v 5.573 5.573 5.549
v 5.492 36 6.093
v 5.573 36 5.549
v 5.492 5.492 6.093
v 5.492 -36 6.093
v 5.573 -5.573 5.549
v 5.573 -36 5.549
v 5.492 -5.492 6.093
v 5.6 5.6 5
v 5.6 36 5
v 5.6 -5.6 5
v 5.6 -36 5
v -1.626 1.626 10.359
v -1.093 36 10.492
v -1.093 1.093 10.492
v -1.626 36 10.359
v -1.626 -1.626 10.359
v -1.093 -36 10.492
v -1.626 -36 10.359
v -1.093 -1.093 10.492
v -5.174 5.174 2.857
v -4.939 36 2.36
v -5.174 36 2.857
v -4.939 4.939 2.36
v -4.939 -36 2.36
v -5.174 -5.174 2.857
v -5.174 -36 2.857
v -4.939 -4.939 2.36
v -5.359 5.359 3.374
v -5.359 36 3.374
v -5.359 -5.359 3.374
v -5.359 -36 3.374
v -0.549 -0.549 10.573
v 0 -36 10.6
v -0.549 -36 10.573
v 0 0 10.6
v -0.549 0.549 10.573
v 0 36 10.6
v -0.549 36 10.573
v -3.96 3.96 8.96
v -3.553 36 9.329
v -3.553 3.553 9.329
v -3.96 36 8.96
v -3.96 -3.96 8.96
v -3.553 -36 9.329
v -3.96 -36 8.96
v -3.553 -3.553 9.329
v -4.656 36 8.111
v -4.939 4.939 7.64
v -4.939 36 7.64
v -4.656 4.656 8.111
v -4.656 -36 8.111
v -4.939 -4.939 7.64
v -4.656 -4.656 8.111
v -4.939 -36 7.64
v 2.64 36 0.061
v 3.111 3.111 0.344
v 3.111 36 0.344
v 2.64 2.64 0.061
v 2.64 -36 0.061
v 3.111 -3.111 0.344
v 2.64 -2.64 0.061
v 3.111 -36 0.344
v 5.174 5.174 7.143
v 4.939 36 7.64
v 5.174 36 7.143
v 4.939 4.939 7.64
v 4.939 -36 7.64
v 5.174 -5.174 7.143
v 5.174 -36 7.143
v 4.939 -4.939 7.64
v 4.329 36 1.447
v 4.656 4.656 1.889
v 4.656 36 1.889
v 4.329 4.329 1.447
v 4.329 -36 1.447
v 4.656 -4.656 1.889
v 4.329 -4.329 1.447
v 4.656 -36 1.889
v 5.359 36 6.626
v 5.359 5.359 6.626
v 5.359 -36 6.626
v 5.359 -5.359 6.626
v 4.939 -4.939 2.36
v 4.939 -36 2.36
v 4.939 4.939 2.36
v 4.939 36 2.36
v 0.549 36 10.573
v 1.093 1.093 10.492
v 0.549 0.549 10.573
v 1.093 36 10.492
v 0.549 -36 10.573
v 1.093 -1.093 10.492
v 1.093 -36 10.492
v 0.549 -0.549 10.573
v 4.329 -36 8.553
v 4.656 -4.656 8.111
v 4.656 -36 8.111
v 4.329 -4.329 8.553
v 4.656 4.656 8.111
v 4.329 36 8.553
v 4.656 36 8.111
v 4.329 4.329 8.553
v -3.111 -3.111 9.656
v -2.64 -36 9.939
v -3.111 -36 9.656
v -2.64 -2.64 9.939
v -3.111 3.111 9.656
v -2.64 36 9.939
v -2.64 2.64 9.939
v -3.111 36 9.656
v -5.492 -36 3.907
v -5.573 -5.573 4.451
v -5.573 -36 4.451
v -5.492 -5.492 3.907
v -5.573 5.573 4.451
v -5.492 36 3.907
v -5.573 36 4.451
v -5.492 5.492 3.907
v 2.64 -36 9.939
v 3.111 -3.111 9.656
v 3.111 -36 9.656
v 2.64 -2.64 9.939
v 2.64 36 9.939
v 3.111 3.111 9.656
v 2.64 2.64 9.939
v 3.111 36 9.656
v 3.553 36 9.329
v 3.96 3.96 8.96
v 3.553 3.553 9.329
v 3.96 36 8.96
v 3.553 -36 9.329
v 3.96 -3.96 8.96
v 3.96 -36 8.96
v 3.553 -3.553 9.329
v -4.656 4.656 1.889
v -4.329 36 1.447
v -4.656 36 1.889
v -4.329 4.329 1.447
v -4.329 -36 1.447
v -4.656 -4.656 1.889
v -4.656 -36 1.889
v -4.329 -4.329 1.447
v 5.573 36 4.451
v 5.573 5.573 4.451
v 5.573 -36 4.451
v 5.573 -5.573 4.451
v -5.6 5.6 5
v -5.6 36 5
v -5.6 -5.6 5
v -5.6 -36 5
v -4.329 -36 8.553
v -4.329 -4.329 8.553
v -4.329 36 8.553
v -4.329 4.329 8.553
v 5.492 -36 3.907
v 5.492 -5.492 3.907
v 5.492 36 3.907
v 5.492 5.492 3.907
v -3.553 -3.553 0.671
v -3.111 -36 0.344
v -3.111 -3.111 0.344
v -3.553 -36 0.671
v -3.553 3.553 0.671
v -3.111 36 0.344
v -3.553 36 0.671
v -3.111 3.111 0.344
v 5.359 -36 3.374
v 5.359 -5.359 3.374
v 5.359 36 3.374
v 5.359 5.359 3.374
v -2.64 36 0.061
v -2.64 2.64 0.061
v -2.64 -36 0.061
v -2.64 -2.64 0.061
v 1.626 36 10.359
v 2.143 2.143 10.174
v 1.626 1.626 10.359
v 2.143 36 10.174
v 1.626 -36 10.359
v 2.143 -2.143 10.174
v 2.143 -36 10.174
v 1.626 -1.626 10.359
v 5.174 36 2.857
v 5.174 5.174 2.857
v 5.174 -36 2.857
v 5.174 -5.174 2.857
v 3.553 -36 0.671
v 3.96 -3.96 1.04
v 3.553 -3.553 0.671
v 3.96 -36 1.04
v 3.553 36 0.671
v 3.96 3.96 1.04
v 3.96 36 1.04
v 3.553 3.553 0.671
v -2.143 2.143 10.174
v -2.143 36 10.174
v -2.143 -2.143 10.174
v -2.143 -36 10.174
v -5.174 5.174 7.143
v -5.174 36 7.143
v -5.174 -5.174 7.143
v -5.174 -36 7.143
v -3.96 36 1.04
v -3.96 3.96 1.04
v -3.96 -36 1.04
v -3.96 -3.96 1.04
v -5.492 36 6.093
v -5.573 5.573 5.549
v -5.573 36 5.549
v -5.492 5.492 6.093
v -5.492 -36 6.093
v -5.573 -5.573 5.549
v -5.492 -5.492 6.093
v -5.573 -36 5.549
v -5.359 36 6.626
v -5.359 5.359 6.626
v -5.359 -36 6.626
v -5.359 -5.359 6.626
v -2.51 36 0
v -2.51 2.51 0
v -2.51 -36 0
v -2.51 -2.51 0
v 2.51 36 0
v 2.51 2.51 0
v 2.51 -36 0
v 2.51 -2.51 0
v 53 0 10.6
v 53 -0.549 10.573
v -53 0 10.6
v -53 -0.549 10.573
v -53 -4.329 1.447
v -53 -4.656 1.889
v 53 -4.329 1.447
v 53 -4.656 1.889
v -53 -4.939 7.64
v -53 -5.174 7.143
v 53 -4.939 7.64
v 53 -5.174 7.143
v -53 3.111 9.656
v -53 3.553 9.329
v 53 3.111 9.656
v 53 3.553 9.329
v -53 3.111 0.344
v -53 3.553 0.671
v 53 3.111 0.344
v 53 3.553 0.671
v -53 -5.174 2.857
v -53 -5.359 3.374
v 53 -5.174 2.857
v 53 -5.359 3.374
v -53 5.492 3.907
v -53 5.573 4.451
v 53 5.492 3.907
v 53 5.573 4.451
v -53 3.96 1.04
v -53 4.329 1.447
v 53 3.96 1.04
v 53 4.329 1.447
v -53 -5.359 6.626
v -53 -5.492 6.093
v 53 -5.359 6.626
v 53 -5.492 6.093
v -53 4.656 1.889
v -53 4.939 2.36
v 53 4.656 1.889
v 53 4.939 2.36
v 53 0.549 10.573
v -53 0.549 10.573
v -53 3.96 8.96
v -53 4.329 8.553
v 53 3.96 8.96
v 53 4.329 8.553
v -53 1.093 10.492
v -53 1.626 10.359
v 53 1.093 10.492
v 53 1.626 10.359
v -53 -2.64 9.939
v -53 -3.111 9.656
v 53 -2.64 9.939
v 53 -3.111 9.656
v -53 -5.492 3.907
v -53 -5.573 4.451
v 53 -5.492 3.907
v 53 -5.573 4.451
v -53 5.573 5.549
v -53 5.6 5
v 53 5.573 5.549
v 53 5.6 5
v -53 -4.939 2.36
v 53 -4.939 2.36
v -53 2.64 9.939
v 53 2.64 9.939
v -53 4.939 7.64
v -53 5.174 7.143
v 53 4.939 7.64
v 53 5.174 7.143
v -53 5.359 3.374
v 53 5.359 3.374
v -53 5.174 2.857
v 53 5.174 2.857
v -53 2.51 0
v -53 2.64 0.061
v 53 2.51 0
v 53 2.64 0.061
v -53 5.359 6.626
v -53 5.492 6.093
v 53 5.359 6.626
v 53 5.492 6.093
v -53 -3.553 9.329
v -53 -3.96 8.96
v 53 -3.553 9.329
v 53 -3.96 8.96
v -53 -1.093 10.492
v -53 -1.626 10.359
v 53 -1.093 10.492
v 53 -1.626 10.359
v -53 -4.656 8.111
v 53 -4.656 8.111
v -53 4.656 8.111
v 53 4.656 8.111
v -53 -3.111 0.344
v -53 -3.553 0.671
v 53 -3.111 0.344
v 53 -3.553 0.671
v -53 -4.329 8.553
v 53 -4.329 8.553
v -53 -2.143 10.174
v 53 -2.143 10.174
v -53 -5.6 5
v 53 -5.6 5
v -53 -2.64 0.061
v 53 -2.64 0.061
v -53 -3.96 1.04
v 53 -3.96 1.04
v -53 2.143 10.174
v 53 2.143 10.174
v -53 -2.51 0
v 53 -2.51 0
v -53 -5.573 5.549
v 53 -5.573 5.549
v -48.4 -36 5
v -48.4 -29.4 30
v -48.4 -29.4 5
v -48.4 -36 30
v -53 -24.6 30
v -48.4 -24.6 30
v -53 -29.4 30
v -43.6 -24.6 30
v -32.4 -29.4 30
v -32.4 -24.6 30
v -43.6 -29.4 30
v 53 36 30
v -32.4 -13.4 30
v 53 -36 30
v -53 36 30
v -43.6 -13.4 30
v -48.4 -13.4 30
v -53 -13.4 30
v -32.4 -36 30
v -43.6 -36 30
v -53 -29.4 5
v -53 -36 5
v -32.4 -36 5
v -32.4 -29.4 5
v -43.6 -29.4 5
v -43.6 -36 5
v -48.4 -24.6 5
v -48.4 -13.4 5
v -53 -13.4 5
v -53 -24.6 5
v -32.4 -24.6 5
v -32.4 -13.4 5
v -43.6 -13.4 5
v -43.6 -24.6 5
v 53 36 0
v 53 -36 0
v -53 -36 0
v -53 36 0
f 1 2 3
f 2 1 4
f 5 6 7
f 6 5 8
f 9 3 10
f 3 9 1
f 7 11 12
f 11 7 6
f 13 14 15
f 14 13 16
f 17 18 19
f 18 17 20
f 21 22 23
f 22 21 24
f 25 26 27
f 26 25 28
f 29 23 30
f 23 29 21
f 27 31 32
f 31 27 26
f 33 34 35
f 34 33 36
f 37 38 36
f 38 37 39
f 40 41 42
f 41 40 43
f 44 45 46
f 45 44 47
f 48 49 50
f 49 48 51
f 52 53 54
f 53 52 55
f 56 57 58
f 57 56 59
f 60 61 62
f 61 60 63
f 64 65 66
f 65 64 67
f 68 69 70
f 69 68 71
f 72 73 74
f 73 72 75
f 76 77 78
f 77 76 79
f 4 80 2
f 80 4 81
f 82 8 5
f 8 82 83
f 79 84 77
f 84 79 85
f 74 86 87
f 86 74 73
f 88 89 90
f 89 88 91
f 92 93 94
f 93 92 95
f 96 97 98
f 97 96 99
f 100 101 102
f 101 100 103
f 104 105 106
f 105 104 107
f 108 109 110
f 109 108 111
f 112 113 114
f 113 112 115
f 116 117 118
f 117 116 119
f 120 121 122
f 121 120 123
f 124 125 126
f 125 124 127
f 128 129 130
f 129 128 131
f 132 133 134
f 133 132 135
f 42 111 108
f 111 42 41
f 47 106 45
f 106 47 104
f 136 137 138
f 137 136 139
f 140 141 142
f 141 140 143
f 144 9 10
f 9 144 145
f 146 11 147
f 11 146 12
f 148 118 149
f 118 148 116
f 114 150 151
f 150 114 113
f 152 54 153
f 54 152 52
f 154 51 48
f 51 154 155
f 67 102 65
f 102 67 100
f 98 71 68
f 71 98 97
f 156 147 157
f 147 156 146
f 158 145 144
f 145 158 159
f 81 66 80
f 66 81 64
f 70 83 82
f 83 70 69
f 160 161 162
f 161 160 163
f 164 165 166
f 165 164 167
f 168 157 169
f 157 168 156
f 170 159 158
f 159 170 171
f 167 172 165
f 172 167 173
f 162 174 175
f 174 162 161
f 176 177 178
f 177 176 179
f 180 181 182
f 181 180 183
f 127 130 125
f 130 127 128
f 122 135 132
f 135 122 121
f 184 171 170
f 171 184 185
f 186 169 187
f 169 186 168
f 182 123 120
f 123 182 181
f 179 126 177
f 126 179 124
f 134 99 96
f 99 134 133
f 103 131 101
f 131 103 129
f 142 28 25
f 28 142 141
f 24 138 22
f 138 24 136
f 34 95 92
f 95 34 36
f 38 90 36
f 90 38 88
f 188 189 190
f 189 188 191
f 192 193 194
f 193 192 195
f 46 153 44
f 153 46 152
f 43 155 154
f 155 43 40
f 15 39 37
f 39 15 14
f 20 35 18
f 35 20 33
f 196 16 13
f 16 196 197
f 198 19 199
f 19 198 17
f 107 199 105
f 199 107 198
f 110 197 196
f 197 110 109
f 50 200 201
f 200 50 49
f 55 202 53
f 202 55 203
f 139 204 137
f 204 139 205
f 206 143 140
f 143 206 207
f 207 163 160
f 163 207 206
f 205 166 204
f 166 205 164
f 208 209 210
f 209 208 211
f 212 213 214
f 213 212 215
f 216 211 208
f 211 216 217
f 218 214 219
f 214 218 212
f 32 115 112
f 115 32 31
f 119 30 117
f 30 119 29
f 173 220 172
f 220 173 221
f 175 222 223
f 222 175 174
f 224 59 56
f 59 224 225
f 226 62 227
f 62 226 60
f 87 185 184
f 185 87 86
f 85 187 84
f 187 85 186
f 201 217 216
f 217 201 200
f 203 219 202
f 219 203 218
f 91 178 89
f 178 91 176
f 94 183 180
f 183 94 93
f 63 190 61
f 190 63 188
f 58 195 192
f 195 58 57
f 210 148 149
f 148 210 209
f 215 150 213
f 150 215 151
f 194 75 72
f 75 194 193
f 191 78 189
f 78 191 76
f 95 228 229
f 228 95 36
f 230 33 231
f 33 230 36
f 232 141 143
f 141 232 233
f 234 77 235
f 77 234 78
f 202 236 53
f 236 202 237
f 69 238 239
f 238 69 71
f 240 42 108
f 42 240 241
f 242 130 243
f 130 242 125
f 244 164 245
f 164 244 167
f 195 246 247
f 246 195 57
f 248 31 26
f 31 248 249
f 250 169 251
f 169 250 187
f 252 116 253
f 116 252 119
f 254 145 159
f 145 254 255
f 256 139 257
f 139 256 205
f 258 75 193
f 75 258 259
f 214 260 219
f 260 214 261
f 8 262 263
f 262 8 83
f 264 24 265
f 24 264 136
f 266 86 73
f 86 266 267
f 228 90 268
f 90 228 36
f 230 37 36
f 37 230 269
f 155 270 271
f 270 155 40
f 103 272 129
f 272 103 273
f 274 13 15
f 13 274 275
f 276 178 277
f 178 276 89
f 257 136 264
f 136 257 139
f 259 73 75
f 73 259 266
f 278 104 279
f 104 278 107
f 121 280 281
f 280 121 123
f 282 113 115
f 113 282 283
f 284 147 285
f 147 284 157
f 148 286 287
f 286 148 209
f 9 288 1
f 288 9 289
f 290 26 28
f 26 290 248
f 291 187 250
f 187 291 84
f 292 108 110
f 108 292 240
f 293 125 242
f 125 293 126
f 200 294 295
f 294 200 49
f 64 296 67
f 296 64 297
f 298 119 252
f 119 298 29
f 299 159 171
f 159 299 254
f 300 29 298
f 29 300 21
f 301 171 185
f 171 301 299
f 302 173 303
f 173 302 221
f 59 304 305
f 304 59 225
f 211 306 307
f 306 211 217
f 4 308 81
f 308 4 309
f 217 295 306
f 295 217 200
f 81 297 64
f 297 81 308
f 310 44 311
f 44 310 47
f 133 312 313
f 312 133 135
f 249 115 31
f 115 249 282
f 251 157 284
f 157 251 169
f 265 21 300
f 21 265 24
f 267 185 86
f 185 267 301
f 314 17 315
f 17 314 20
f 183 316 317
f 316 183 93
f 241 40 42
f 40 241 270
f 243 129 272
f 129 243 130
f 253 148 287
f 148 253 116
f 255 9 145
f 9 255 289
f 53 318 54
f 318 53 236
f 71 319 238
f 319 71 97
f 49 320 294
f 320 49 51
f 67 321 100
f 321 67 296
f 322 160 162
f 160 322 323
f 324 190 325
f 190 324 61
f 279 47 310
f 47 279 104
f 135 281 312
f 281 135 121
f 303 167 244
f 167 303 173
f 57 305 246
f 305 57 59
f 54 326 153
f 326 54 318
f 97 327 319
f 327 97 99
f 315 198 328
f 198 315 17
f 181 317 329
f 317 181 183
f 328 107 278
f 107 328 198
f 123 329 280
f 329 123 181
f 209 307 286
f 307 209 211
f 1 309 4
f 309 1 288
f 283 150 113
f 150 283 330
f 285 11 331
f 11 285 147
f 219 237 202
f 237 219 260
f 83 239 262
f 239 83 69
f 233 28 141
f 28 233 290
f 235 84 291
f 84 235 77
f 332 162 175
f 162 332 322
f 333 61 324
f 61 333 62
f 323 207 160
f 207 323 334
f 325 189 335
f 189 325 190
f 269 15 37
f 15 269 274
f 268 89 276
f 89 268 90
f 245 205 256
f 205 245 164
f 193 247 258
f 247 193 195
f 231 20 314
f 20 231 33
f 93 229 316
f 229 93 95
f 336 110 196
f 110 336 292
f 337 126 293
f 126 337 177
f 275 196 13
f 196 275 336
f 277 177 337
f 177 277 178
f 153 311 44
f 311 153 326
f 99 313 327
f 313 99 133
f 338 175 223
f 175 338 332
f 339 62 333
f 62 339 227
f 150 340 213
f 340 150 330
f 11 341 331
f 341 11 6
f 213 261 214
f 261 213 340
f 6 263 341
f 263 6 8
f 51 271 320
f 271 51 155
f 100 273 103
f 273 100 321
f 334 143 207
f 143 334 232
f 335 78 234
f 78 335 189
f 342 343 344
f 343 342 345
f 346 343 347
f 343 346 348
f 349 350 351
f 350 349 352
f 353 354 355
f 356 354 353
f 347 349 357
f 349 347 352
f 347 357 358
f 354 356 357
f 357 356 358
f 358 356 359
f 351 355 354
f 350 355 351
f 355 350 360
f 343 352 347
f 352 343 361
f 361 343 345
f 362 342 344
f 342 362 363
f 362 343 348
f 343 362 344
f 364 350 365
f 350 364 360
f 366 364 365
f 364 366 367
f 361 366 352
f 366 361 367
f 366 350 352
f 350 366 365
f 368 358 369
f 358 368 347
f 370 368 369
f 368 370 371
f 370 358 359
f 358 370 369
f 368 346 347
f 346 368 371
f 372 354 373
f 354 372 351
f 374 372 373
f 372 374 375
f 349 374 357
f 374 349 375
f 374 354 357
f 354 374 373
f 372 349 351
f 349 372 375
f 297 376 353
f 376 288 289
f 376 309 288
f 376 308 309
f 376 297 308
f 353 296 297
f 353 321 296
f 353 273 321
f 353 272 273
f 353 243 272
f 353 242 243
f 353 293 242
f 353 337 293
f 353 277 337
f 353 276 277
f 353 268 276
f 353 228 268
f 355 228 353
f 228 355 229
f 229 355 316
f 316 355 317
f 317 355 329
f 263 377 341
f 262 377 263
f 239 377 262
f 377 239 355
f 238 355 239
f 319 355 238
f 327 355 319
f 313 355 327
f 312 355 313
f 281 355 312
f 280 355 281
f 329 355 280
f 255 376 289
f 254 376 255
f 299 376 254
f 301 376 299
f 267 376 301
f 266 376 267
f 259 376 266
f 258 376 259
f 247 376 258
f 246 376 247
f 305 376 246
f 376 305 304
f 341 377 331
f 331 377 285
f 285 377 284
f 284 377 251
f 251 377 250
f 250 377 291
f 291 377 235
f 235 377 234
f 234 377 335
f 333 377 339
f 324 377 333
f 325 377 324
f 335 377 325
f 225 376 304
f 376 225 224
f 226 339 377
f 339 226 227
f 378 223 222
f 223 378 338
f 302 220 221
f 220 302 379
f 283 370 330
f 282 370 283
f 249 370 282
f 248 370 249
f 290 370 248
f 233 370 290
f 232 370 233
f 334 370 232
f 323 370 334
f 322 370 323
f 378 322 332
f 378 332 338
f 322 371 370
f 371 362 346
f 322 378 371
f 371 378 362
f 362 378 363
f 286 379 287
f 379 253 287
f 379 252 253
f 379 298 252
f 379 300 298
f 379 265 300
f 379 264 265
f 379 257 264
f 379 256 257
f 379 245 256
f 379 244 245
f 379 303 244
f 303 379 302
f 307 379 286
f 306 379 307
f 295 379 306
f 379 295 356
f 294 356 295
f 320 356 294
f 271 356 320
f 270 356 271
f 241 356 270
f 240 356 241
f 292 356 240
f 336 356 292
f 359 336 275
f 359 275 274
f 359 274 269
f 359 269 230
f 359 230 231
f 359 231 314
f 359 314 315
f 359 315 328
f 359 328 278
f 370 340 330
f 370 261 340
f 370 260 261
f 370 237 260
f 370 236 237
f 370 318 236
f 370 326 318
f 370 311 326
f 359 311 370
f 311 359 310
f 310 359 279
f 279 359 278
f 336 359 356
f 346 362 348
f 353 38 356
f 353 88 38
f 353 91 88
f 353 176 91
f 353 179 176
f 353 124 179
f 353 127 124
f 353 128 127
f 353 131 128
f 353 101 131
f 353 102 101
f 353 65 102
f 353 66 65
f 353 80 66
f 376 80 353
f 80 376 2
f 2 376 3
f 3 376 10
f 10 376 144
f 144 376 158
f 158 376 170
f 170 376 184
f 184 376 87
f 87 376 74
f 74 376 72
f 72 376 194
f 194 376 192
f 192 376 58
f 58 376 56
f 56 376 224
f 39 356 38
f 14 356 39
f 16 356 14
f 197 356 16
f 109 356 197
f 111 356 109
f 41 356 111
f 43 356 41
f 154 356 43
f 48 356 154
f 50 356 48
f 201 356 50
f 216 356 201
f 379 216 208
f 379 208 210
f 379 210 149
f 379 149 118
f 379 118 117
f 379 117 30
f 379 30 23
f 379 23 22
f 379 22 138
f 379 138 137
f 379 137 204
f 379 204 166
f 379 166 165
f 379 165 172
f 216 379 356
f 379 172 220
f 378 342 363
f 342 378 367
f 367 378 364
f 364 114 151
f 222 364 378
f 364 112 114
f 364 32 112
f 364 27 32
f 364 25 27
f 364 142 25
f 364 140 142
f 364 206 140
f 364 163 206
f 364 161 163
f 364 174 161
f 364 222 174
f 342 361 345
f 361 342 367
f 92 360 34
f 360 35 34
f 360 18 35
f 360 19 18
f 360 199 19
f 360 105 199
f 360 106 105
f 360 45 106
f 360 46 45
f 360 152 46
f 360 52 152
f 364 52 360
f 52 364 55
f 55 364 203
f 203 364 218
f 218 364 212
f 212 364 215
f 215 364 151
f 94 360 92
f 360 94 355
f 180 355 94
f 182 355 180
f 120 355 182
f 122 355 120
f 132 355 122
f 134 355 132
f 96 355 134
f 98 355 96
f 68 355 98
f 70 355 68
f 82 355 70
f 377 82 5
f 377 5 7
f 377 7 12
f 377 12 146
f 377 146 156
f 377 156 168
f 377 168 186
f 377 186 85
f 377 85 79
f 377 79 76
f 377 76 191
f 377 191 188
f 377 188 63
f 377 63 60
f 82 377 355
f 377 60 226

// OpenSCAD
// Built by bench/smallmodels/features/compiler.py from a list of features.
$fn = 64;
difference() {
  union() {
    translate([0, 0, 0]) translate([-53, -36, 0]) cube([106, 72, 30]);
  }
  union() {
    translate([0, 0, 5]) rotate([0, 0, 0]) rotate([90, 0, 0]) cylinder(d = 11.2, h = 1120, center = true);
    translate([0, 0, 5]) rotate([0, 0, 0]) rotate([0, 90, 0]) cylinder(d = 11.2, h = 1120, center = true);
    translate([-118, -67, 5]) rotate([0, 0, 0]) translate([-5.6, -5.6, 0]) cube([11.2, 11.2, 25]);
    translate([-102, -67, 5]) rotate([0, 0, 0]) translate([-5.6, -5.6, 0]) cube([11.2, 11.2, 25]);
    translate([-86, -67, 5]) rotate([0, 0, 0]) translate([-5.6, -5.6, 0]) cube([11.2, 11.2, 25]);
    translate([-70, -67, 5]) rotate([0, 0, 0]) translate([-5.6, -5.6, 0]) cube([11.2, 11.2, 25]);
    translate([-54, -67, 5]) rotate([0, 0, 0]) translate([-5.6, -5.6, 0]) cube([11.2, 11.2, 25]);
    translate([-38, -67, 5]) rotate([0, 0, 0]) translate([-5.6, -5.6, 0]) cube([11.2, 11.2, 25]);
    translate([-118, -51, 5]) rotate([0, 0, 0]) translate([-5.6, -5.6, 0]) cube([11.2, 11.2, 25]);
    translate([-102, -51, 5]) rotate([0, 0, 0]) translate([-5.6, -5.6, 0]) cube([11.2, 11.2, 25]);
    translate([-86, -51, 5]) rotate([0, 0, 0]) translate([-5.6, -5.6, 0]) cube([11.2, 11.2, 25]);
    translate([-70, -51, 5]) rotate([0, 0, 0]) translate([-5.6, -5.6, 0]) cube([11.2, 11.2, 25]);
    translate([-54, -51, 5]) rotate([0, 0, 0]) translate([-5.6, -5.6, 0]) cube([11.2, 11.2, 25]);
    translate([-38, -51, 5]) rotate([0, 0, 0]) translate([-5.6, -5.6, 0]) cube([11.2, 11.2, 25]);
    translate([-118, -35, 5]) rotate([0, 0, 0]) translate([-5.6, -5.6, 0]) cube([11.2, 11.2, 25]);
    translate([-102, -35, 5]) rotate([0, 0, 0]) translate([-5.6, -5.6, 0]) cube([11.2, 11.2, 25]);
    translate([-86, -35, 5]) rotate([0, 0, 0]) translate([-5.6, -5.6, 0]) cube([11.2, 11.2, 25]);
    translate([-70, -35, 5]) rotate([0, 0, 0]) translate([-5.6, -5.6, 0]) cube([11.2, 11.2, 25]);
    translate([-54, -35, 5]) rotate([0, 0, 0]) translate([-5.6, -5.6, 0]) cube([11.2, 11.2, 25]);
    translate([-38, -35, 5]) rotate([0, 0, 0]) translate([-5.6, -5.6, 0]) cube([11.2, 11.2, 25]);
    translate([-118, -19, 5]) rotate([0, 0, 0]) translate([-5.6, -5.6, 0]) cube([11.2, 11.2, 25]);
    translate([-102, -19, 5]) rotate([0, 0, 0]) translate([-5.6, -5.6, 0]) cube([11.2, 11.2, 25]);
    translate([-86, -19, 5]) rotate([0, 0, 0]) translate([-5.6, -5.6, 0]) cube([11.2, 11.2, 25]);
    translate([-70, -19, 5]) rotate([0, 0, 0]) translate([-5.6, -5.6, 0]) cube([11.2, 11.2, 25]);
    translate([-54, -19, 5]) rotate([0, 0, 0]) translate([-5.6, -5.6, 0]) cube([11.2, 11.2, 25]);
    translate([-38, -19, 5]) rotate([0, 0, 0]) translate([-5.6, -5.6, 0]) cube([11.2, 11.2, 25]);
  }
}
